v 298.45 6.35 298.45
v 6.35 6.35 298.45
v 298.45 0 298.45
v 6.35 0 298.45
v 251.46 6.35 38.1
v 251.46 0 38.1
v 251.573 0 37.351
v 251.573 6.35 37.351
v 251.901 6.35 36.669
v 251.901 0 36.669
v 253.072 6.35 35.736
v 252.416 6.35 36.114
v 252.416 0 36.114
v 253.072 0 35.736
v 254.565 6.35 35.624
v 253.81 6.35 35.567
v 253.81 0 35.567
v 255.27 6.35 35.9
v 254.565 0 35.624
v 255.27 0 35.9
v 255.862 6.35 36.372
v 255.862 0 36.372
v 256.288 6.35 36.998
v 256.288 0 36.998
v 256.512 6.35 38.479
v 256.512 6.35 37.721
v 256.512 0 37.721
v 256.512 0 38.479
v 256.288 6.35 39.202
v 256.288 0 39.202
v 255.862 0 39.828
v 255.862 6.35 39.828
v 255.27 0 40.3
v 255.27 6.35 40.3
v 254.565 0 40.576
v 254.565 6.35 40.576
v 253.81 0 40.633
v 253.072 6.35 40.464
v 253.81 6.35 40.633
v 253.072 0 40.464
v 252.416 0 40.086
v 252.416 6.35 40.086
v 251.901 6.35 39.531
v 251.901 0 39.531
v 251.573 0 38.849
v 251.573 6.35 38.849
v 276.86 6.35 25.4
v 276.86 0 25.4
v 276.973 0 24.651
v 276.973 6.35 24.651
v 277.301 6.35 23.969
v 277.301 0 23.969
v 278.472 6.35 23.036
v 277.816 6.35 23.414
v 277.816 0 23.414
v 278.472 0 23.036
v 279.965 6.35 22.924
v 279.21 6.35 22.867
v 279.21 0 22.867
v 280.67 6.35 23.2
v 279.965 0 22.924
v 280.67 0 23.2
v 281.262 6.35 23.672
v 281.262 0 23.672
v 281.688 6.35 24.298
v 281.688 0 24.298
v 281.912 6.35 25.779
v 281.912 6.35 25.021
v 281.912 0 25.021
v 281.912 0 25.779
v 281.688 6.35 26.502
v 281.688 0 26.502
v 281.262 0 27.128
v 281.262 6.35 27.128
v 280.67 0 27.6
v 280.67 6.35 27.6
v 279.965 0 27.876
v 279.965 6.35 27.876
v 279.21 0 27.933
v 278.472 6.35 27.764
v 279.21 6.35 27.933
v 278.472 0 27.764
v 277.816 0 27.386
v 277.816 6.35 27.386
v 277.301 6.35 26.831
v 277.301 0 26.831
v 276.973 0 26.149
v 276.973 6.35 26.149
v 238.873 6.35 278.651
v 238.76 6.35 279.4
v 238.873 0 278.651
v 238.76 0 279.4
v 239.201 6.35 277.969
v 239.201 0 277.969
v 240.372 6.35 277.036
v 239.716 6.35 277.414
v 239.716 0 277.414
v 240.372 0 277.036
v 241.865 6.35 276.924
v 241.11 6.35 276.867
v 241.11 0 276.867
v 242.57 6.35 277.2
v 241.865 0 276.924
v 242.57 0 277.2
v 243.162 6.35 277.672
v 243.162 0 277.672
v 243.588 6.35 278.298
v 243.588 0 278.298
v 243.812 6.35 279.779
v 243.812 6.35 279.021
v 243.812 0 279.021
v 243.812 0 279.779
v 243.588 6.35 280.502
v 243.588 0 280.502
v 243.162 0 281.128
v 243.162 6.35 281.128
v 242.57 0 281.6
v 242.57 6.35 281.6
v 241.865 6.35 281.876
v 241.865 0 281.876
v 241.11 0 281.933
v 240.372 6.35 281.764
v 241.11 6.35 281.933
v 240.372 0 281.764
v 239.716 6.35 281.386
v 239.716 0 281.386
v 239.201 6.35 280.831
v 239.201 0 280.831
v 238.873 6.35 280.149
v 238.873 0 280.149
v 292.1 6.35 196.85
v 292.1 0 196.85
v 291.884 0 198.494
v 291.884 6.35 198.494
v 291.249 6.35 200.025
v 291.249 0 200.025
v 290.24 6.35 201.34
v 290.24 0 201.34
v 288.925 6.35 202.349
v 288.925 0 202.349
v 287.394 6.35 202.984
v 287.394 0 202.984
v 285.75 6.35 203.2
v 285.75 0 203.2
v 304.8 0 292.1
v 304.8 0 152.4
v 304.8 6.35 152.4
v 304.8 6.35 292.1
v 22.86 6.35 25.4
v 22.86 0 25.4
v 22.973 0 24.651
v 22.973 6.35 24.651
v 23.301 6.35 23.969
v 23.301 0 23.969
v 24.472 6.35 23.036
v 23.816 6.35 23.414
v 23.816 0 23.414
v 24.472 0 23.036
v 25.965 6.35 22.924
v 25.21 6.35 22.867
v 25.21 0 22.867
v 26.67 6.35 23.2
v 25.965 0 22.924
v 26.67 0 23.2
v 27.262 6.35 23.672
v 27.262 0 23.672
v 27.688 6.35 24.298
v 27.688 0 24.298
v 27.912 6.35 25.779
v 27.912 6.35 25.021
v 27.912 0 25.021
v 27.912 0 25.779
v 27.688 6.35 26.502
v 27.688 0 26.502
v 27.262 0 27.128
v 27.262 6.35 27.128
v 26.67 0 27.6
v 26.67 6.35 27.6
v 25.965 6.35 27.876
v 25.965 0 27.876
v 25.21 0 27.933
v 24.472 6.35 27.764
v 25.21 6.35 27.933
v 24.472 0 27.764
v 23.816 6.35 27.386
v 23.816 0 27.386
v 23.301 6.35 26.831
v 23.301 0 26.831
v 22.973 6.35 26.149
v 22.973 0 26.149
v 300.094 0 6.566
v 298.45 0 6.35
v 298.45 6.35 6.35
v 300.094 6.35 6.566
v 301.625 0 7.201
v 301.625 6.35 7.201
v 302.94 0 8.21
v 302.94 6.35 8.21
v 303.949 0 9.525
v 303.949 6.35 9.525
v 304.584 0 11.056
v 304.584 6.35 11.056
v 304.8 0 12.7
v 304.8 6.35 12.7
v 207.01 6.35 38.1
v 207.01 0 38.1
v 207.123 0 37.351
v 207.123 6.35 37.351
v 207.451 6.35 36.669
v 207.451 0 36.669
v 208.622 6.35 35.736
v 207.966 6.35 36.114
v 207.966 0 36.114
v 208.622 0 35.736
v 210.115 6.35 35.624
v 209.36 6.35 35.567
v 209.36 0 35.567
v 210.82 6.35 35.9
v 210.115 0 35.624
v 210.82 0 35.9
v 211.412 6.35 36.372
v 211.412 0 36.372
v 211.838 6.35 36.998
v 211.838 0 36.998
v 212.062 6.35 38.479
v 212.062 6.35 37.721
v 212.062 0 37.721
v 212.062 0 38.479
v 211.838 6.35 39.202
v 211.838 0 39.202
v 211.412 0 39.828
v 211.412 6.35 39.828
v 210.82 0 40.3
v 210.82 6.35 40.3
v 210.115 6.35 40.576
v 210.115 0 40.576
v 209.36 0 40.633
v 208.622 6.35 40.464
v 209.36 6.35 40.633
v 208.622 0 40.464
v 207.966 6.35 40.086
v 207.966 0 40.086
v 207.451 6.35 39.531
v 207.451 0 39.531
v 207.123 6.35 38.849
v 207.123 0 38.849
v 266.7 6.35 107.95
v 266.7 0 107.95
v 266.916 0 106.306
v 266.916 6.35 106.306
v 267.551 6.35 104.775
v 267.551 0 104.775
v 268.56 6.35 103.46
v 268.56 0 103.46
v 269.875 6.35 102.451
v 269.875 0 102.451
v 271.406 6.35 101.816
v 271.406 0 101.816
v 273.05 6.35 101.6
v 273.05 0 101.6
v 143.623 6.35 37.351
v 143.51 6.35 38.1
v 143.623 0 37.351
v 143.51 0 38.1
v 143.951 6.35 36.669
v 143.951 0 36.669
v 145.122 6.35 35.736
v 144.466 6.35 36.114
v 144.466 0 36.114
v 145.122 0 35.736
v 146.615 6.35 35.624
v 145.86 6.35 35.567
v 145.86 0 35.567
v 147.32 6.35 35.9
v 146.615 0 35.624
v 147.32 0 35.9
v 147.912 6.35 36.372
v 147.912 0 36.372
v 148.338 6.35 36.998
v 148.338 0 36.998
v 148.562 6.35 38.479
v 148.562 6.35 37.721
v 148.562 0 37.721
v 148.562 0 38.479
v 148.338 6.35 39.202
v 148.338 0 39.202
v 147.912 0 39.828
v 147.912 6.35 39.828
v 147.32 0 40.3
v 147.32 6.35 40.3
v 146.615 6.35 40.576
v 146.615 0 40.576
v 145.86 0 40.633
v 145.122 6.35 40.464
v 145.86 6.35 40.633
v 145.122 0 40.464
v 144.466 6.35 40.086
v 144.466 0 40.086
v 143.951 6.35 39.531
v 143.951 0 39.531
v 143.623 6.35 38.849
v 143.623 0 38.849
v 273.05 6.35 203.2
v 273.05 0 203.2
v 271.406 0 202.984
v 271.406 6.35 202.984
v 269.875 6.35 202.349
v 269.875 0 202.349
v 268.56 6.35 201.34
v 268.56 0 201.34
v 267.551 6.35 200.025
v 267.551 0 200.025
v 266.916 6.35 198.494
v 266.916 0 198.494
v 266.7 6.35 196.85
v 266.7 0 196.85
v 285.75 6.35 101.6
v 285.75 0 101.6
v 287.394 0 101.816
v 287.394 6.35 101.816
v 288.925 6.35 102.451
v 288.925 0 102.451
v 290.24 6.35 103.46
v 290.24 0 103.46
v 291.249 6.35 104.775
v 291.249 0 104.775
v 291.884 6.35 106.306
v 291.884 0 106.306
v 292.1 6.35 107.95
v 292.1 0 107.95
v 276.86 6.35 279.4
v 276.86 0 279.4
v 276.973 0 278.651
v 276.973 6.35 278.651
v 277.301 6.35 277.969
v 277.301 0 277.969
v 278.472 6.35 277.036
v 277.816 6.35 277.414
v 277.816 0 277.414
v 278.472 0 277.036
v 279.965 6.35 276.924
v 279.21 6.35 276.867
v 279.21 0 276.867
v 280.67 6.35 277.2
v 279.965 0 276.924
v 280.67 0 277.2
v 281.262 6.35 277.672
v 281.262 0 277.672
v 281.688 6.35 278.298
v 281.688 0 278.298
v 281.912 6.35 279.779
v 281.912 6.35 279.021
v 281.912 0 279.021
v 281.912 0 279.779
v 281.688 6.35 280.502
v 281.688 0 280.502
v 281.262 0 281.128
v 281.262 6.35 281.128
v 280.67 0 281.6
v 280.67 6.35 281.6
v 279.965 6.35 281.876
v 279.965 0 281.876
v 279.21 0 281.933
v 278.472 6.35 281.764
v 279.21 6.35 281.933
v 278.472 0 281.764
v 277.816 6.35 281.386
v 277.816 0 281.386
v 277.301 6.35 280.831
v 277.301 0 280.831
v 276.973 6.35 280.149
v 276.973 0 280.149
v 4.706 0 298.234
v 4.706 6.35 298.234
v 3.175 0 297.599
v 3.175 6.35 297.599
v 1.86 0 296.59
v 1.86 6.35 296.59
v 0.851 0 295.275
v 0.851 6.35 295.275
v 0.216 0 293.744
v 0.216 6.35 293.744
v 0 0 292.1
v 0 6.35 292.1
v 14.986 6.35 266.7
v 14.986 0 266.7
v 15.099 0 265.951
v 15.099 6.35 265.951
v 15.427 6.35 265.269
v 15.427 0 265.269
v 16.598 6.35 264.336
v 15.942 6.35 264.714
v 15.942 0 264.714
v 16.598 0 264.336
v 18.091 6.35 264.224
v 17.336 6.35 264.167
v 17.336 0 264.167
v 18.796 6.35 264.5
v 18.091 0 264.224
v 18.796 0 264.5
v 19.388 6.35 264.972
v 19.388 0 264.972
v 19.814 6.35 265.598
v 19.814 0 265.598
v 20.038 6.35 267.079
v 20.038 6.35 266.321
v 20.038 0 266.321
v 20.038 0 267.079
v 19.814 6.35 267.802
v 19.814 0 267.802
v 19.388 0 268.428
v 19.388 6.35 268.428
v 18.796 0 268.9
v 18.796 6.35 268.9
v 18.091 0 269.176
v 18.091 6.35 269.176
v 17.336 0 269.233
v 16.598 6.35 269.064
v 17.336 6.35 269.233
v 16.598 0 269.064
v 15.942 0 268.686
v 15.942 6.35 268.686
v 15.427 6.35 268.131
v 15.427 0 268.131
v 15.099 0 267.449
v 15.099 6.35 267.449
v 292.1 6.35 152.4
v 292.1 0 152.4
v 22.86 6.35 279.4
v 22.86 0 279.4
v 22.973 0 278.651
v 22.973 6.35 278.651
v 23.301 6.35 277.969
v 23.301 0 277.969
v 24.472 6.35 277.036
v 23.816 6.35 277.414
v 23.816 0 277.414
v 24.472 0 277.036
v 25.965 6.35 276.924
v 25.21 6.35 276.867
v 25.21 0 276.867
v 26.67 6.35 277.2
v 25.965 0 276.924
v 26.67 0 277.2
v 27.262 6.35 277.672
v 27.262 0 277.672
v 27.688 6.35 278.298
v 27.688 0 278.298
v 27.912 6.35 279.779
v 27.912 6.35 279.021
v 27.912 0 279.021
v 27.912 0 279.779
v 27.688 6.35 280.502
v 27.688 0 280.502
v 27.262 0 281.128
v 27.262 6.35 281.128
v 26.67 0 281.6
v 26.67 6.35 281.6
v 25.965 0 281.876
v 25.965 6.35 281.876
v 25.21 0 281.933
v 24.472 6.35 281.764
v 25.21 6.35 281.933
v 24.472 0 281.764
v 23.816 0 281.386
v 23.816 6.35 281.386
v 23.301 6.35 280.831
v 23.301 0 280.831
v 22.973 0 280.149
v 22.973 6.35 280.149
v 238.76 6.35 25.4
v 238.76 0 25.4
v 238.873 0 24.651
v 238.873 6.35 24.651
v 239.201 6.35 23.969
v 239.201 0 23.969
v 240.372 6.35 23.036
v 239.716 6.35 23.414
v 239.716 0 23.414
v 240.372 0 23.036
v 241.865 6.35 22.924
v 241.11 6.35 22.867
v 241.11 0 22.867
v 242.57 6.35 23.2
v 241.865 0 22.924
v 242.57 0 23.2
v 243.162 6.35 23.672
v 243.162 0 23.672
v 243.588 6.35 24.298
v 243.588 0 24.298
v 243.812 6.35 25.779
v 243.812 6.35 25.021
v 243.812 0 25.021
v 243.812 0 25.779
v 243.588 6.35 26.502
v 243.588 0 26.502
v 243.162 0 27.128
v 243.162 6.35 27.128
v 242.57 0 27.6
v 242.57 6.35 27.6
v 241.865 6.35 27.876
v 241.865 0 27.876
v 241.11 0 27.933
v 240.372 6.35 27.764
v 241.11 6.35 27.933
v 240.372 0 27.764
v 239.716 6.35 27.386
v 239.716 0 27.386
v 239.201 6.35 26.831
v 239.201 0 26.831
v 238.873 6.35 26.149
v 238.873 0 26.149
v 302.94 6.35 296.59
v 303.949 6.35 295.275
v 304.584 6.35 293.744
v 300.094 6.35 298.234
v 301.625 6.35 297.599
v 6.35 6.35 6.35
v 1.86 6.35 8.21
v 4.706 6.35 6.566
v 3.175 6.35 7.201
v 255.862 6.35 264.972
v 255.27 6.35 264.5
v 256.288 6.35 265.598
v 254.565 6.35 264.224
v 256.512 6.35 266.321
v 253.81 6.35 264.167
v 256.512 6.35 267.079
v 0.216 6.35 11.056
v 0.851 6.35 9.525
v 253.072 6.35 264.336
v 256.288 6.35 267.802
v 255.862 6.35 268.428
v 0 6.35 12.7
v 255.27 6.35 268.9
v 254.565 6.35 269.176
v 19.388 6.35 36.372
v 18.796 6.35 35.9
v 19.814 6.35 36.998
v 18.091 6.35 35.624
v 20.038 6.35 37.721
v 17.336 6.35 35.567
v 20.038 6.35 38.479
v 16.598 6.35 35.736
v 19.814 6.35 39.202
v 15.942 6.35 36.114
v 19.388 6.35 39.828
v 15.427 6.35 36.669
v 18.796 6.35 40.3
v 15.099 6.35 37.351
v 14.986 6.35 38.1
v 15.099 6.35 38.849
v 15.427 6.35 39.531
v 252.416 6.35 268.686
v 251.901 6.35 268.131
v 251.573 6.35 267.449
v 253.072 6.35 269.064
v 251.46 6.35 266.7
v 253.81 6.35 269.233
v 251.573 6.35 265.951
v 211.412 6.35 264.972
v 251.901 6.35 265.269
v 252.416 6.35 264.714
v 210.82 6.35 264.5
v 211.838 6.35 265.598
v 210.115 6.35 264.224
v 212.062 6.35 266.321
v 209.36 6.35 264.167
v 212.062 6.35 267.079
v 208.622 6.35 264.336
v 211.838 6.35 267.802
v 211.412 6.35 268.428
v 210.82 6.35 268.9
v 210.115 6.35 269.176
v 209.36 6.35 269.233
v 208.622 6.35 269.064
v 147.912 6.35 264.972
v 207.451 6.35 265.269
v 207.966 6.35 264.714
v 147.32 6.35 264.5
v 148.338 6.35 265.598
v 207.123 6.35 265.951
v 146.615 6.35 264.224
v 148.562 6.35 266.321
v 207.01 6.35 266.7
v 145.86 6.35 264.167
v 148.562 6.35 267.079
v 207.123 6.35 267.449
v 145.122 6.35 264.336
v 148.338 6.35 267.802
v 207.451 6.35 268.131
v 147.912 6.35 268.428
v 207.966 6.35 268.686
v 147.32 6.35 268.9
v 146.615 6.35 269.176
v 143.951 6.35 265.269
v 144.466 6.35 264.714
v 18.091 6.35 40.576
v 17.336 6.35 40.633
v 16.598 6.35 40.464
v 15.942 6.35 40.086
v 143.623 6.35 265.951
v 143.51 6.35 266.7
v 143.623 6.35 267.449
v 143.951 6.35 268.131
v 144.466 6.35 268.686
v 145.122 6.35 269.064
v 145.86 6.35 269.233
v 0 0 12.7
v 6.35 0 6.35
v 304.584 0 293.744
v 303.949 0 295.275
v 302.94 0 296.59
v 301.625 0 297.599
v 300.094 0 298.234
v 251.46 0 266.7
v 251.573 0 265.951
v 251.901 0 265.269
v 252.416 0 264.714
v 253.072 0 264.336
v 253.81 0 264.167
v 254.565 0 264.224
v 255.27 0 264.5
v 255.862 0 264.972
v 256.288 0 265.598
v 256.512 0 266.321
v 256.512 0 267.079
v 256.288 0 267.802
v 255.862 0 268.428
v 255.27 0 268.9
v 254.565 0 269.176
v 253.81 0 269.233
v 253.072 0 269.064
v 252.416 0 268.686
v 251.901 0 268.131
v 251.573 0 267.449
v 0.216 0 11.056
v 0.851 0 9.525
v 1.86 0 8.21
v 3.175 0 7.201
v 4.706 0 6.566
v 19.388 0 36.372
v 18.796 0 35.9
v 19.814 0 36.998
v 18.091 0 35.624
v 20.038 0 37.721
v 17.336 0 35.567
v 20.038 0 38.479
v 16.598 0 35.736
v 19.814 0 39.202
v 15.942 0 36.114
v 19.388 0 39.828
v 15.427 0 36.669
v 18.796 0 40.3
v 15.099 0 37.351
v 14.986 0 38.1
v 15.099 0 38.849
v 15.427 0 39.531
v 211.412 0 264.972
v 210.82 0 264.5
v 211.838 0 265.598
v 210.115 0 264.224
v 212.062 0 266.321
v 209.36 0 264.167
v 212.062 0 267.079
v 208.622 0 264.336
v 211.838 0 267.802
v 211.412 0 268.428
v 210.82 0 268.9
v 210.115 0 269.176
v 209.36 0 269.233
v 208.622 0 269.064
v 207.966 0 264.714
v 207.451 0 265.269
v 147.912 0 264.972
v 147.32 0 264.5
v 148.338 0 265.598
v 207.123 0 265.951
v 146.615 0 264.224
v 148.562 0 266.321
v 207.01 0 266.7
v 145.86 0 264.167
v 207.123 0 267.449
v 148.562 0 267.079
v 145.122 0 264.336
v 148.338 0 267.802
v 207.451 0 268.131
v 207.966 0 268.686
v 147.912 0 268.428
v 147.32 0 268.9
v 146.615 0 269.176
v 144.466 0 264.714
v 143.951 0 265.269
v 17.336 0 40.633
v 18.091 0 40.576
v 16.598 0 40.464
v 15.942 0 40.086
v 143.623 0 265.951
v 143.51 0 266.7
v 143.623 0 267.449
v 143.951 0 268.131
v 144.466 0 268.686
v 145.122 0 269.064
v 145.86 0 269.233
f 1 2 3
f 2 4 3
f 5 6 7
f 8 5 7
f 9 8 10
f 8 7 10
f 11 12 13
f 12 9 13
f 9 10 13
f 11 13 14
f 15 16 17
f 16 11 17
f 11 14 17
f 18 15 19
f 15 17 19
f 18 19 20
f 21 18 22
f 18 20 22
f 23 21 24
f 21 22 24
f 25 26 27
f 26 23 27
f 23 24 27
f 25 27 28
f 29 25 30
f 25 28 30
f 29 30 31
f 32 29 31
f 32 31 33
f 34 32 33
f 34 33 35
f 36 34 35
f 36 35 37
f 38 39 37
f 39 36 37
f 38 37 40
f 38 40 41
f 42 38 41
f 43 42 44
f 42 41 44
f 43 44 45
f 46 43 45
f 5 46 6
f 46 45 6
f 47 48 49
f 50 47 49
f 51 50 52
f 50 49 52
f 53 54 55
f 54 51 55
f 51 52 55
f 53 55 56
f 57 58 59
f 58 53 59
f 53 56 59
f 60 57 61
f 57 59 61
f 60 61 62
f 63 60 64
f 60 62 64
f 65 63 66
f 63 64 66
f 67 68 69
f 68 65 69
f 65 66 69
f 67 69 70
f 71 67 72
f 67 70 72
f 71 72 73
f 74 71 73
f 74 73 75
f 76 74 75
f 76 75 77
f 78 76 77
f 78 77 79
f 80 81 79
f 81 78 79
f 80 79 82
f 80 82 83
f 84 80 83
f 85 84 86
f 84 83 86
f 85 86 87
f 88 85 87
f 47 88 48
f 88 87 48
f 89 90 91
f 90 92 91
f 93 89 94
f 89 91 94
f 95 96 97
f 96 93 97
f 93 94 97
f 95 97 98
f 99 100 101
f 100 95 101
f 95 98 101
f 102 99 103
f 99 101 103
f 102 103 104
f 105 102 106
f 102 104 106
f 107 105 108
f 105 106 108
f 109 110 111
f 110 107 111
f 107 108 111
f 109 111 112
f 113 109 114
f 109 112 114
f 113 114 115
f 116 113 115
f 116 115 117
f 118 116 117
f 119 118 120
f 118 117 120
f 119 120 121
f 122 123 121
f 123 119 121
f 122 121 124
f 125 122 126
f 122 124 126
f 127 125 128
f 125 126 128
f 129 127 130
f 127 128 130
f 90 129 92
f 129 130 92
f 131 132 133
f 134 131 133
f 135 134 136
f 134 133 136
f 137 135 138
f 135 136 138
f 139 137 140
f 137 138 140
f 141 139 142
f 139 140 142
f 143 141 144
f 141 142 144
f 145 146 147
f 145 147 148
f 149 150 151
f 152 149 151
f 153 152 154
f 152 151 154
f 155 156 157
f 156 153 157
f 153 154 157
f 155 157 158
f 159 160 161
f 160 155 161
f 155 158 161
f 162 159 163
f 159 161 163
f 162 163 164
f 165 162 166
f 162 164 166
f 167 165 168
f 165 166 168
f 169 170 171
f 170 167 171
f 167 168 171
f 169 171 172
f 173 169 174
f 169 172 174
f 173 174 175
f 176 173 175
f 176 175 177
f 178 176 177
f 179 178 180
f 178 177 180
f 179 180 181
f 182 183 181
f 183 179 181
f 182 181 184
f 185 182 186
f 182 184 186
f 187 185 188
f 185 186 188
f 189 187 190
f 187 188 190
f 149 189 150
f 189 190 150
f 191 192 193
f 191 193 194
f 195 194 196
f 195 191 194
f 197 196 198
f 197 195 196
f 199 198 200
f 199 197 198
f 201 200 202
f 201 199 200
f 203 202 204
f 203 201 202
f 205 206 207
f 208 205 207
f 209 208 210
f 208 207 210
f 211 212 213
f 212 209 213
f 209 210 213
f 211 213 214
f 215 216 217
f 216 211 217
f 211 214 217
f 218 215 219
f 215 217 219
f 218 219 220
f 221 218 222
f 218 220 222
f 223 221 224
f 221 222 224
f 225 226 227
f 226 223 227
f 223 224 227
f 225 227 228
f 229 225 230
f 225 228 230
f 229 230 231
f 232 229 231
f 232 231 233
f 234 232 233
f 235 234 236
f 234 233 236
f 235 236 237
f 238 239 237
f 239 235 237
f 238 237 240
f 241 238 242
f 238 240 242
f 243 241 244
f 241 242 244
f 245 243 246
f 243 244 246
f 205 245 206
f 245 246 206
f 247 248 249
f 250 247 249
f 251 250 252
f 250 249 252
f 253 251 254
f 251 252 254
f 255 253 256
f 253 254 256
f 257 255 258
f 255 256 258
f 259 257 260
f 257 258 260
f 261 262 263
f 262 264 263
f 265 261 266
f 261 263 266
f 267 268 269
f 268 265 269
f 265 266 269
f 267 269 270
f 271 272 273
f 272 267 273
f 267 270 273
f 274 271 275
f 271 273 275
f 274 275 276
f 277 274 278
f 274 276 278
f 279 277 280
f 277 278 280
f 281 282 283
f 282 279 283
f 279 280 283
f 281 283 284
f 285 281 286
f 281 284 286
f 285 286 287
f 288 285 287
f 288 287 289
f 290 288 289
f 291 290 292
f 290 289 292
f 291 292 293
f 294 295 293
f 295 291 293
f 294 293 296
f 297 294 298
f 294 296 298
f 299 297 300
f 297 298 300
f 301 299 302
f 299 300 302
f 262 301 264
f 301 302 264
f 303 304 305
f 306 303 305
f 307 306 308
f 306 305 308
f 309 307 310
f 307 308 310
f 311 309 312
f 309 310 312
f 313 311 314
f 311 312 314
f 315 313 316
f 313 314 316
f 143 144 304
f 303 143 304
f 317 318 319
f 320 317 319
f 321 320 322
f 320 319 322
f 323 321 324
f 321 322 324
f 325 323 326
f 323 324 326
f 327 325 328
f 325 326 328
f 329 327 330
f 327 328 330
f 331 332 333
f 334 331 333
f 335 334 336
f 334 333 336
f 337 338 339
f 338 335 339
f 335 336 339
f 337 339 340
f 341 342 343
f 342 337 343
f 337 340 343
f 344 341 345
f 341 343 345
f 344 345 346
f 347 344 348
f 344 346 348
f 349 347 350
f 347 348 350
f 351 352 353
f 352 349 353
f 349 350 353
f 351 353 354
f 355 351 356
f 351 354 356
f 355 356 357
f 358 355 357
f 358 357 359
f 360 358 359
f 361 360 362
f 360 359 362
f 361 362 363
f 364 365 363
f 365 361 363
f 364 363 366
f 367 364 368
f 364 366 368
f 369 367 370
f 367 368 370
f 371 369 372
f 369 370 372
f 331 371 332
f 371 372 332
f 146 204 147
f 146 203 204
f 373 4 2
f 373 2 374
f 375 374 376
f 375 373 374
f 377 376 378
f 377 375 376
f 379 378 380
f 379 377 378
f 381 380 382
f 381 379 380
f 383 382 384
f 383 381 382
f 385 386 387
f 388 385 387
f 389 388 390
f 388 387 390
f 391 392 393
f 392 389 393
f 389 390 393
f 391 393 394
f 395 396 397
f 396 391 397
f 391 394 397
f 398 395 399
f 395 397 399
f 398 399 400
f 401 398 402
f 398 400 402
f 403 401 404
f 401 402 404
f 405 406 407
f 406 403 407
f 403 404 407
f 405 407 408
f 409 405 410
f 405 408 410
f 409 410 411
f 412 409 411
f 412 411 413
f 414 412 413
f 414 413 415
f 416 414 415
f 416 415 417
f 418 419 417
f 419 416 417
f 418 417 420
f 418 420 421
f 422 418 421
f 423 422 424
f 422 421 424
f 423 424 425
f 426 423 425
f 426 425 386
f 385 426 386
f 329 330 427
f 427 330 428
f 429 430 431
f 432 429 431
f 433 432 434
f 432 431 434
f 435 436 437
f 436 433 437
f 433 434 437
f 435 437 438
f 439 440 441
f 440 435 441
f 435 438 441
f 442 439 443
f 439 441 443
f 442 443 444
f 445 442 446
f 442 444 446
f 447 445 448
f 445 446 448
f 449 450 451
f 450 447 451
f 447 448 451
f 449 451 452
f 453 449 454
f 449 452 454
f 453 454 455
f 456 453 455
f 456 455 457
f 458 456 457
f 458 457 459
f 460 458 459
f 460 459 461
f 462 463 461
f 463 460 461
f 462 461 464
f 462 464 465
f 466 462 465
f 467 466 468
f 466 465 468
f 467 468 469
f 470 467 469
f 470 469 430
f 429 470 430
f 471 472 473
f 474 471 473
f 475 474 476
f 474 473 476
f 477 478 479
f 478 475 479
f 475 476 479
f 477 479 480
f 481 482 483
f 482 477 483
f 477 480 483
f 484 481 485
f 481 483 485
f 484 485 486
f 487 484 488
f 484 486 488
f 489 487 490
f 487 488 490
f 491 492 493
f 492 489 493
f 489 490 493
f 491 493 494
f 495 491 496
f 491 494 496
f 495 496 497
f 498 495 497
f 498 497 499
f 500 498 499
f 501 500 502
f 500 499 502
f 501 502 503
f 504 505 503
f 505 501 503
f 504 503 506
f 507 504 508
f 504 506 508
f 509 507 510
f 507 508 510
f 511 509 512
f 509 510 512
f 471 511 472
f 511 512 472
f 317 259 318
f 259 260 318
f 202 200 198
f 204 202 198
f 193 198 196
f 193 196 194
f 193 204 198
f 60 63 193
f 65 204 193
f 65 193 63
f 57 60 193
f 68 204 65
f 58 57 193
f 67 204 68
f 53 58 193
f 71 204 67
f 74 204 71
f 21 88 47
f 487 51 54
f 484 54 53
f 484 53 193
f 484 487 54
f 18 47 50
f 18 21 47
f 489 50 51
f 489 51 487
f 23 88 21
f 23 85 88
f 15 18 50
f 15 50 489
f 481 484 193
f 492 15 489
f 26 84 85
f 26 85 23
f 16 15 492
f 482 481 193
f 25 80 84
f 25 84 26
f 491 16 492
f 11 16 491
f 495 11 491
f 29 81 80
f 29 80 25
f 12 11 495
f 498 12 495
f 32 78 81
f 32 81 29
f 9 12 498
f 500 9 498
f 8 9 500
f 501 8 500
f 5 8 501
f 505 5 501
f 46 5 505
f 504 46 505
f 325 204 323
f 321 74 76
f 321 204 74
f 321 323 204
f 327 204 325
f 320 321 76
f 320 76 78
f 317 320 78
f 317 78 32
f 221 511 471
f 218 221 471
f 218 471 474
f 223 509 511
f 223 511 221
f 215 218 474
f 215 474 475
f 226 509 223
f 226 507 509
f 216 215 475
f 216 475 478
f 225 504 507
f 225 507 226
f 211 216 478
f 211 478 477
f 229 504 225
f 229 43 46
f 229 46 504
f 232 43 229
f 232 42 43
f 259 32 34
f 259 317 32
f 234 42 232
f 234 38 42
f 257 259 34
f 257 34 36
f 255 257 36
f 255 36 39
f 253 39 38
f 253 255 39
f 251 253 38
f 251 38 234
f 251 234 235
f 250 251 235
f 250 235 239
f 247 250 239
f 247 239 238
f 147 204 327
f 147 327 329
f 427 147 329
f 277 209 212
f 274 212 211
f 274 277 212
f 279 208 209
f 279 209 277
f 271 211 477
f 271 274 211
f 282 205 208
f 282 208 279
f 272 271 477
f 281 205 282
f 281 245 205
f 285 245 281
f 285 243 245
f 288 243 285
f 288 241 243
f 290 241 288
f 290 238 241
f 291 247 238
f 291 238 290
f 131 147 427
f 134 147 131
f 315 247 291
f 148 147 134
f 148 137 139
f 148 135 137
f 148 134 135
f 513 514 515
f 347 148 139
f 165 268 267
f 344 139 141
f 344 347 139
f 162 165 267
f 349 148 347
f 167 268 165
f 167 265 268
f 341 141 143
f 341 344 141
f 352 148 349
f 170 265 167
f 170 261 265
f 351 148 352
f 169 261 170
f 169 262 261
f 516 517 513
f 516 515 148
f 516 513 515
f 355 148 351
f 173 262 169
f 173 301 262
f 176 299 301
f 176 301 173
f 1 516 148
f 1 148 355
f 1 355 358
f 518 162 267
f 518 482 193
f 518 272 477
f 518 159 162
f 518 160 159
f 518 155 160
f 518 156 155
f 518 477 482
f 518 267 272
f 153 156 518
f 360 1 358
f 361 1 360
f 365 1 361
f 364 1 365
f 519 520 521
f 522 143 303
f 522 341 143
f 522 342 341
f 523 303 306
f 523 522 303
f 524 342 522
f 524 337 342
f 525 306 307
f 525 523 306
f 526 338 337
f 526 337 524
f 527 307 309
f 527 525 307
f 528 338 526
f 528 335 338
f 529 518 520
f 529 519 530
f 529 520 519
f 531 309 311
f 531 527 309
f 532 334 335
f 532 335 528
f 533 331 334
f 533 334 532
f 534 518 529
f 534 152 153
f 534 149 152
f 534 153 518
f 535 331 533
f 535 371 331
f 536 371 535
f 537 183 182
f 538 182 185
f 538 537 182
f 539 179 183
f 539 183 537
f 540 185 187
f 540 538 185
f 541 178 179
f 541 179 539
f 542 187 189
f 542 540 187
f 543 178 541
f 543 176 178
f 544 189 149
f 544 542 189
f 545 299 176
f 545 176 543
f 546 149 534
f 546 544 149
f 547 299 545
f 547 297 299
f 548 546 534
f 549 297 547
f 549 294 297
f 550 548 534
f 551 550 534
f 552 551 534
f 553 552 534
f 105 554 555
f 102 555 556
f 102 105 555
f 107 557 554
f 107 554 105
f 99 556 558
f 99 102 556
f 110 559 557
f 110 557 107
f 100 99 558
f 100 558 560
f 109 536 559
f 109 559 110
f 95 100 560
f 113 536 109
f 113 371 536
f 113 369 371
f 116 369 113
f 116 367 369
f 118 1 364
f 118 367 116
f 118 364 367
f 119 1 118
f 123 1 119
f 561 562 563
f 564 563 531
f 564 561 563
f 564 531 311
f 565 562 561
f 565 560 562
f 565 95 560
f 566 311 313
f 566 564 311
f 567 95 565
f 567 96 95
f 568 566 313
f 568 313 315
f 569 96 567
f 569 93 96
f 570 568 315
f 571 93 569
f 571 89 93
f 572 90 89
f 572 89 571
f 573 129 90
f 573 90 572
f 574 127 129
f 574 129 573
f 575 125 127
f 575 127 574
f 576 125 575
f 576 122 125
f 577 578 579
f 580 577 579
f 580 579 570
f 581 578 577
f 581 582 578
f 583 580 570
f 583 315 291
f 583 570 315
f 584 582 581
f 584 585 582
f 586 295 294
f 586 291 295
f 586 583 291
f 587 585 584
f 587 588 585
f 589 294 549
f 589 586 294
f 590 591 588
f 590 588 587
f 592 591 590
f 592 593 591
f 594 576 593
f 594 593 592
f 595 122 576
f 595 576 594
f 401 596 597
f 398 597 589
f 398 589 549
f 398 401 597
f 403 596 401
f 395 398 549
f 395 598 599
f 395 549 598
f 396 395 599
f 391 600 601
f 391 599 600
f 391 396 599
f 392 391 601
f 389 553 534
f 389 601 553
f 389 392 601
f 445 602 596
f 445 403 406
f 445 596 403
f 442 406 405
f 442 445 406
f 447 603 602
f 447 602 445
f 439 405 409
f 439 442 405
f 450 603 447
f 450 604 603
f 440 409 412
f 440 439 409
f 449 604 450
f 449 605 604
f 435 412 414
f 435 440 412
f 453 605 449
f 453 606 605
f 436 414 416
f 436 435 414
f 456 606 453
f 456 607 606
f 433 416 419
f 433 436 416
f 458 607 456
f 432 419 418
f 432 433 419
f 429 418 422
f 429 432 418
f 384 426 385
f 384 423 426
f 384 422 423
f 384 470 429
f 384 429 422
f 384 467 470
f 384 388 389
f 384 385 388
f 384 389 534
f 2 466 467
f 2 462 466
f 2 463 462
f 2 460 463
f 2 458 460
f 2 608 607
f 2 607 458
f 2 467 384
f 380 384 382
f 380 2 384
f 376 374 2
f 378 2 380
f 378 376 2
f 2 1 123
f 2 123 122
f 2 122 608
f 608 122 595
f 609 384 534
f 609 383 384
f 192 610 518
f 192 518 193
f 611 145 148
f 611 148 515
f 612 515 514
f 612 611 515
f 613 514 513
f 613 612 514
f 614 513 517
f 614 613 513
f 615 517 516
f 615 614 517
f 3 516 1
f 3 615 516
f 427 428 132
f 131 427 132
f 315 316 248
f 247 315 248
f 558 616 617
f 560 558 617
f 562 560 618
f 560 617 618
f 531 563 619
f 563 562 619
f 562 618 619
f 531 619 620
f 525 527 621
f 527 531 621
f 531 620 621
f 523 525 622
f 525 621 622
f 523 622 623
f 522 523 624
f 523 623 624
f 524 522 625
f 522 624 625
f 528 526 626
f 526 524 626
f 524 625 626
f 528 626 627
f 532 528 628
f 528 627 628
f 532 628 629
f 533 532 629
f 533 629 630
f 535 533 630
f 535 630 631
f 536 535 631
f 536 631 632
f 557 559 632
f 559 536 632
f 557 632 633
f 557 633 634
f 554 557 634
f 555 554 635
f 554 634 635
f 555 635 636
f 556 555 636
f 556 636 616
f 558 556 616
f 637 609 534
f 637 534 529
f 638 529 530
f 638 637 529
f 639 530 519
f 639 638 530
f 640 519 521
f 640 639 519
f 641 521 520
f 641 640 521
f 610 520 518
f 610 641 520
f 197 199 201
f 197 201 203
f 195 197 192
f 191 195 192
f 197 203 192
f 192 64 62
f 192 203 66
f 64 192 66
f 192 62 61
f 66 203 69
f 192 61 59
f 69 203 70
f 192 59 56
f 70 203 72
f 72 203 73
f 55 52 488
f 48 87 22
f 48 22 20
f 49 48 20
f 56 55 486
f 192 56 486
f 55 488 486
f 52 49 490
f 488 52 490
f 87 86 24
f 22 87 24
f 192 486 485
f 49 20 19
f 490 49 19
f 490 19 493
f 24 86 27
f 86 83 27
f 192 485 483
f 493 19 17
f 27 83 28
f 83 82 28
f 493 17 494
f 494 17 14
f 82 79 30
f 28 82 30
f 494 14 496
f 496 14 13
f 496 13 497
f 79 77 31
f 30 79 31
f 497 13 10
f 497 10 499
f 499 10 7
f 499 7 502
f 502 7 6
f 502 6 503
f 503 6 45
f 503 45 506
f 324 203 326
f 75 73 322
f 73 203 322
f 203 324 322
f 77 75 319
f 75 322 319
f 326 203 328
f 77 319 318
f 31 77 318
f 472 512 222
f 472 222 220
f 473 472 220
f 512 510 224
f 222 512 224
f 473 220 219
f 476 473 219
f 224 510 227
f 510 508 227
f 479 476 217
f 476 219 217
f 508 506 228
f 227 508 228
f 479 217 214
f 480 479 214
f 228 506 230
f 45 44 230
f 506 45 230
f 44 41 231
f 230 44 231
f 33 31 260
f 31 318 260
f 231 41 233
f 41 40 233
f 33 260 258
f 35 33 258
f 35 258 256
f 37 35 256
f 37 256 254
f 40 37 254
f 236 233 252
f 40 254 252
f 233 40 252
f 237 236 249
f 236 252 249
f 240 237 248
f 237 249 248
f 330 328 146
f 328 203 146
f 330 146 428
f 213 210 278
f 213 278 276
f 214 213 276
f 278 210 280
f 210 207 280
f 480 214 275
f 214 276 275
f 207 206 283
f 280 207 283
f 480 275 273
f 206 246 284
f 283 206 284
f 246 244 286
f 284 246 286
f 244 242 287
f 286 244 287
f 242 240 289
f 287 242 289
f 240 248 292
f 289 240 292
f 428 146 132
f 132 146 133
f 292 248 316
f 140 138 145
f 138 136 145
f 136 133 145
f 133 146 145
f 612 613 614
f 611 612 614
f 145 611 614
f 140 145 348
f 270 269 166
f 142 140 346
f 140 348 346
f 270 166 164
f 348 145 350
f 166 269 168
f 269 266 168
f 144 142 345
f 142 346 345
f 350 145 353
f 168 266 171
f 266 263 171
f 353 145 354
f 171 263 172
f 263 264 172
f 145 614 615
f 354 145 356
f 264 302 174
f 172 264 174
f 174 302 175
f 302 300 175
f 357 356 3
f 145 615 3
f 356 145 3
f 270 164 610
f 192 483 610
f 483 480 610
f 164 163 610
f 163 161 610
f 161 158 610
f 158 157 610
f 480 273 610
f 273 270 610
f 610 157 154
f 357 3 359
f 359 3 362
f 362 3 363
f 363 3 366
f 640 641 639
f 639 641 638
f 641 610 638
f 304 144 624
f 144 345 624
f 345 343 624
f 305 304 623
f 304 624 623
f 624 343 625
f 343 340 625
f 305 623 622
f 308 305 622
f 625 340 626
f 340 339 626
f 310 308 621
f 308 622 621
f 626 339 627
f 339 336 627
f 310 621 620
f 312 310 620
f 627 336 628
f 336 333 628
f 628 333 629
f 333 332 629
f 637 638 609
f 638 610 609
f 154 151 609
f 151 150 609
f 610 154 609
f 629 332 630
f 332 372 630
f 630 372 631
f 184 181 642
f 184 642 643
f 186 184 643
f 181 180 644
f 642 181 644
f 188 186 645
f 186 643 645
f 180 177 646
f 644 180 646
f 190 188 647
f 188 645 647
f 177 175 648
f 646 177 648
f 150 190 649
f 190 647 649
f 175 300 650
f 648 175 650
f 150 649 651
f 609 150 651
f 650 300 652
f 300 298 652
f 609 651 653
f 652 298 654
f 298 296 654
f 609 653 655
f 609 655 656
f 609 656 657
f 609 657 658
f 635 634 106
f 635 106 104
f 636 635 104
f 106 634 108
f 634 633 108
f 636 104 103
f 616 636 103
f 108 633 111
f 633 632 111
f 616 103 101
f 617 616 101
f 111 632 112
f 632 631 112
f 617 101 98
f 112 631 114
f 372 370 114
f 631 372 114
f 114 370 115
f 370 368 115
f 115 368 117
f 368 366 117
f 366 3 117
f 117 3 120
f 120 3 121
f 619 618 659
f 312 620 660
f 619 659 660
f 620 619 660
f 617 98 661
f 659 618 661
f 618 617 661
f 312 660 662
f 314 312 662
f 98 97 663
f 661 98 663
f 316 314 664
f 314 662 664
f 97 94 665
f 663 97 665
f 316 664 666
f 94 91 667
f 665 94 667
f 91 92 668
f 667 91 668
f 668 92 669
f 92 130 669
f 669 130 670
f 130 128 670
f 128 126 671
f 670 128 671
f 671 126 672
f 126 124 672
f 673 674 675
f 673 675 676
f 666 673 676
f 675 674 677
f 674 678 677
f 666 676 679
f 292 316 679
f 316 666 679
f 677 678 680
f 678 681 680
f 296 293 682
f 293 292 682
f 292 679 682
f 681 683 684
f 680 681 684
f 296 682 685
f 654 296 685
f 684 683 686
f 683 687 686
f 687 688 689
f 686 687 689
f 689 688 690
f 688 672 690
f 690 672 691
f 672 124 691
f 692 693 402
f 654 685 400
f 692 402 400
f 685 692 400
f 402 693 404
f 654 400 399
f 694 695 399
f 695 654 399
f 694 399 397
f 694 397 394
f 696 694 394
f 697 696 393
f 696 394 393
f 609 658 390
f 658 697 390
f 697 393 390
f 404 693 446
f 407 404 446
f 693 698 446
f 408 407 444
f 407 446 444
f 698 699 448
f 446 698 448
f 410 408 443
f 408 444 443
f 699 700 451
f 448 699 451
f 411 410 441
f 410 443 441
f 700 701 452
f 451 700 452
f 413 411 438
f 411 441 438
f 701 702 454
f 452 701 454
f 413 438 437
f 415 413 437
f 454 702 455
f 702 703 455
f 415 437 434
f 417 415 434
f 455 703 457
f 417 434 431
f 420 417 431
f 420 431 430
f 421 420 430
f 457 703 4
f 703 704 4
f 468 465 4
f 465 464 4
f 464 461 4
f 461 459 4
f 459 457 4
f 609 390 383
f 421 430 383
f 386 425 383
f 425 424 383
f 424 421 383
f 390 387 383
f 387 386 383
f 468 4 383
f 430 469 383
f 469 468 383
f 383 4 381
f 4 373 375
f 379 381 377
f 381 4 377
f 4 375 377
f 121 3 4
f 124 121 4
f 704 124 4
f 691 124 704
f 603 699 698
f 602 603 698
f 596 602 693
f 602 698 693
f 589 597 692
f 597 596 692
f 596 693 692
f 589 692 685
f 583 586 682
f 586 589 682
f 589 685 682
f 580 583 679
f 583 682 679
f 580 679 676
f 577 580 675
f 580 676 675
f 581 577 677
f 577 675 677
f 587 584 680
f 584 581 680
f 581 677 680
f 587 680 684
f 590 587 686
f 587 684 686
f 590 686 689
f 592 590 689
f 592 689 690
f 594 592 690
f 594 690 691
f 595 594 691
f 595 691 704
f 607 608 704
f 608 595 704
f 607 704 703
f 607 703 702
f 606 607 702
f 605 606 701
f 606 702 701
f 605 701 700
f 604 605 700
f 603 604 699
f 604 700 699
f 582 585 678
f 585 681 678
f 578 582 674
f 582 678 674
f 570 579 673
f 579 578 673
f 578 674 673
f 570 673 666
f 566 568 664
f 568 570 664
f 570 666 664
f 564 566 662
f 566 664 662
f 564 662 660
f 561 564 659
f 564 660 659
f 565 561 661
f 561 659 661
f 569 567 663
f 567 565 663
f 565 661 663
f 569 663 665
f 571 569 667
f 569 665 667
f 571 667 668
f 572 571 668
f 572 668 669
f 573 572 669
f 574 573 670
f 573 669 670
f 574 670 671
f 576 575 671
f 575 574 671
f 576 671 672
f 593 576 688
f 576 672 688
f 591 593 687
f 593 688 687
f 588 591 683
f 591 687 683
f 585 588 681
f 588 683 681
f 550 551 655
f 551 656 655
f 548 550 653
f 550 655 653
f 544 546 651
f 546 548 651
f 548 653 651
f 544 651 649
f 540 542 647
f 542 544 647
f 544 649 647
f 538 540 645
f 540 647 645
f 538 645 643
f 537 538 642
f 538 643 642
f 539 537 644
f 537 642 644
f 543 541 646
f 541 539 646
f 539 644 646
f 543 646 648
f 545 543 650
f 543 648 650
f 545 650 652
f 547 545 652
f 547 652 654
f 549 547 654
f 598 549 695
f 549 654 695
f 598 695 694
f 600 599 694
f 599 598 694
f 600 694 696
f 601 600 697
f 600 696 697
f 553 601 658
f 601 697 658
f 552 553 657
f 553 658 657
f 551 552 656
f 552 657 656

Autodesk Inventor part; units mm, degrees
ref_plane "YZ Plane" through (0, 0, 0) normal (1, 0, 0) x (0, 1, 0)
ref_plane "XZ Plane" through (0, 0, 0) normal (0, 1, 0) x (-1, 0, 0)
ref_plane "XY Plane" through (0, 0, 0) normal (0, 0, 1) x (1, 0, 0)
sketch "Sketch1" plane through (0, 0, 0) normal (0, 1, 0) x (-1, 0, 0)
  line L0 (-304.8, 25.4) -> (-279.4, 25.4) construction
  line L1 (0, 25.4) -> (-25.4, 25.4) construction
  line L2 (0, 279.4) -> (-25.4, 279.4) construction
  line L3 (-304.8, 279.4) -> (-279.4, 279.4) construction
  circle A0 centre (-25.4, 279.4) radius 2.54
  circle A1 centre (-279.4, 279.4) radius 2.54
  circle A2 centre (-25.4, 25.4) radius 2.54
  circle A3 centre (-279.4, 25.4) radius 2.54
  line L4 (-304.8, 38.1) -> (-254, 38.1) construction
  circle A4 centre (-254, 38.1) radius 2.54
  line L5 (-304.8, 152.4) -> (-230.2081, 152.4) construction
  line L6 (-254, 38.1) -> (-209.55, 38.1) construction
  line L7 (-209.55, 38.1) -> (-146.05, 38.1) construction
  line L8 (-146.05, 38.1) -> (-17.526, 38.1) construction
  circle A5 centre (-209.55, 38.1) radius 2.54
  circle A6 centre (-146.05, 38.1) radius 2.54
  circle A7 centre (-17.526, 38.1) radius 2.54
  circle A8 centre (-254, 266.7) radius 2.54
  circle A9 centre (-209.55, 266.7) radius 2.54
  circle A10 centre (-146.05, 266.7) radius 2.54
  circle A11 centre (-17.526, 266.7) radius 2.54
  line L9 (-6.35, 298.45) -> (-298.45, 298.45)
  line L10 (-6.35, 6.35) -> (-298.45, 6.35)
  line L11 (0, 292.1) -> (0, 12.7)
  line L12 (-304.8, 12.7) -> (-304.8, 292.1)
  line L13 (-304.8, 152.4) -> (-292.1, 152.4)
  line L14 (-292.1, 152.4) -> (-292.1, 196.85)
  line L15 (-285.75, 203.2) -> (-273.05, 203.2)
  line L16 (-266.7, 196.85) -> (-266.7, 107.95)
  line L17 (-273.05, 101.6) -> (-285.75, 101.6)
  line L18 (-292.1, 107.95) -> (-292.1, 152.4)
  arc A12 (-285.75, 203.2) -> (-292.1, 196.85) centre (-285.75, 196.85) ccw
  arc A13 (-292.1, 107.95) -> (-285.75, 101.6) centre (-285.75, 107.95) ccw
  arc A14 (-273.05, 101.6) -> (-266.7, 107.95) centre (-273.05, 107.95) ccw
  arc A15 (-266.7, 196.85) -> (-273.05, 203.2) centre (-273.05, 196.85) ccw
  arc A16 (-304.8, 12.7) -> (-298.45, 6.35) centre (-298.45, 12.7) ccw
  arc A17 (-298.45, 298.45) -> (-304.8, 292.1) centre (-298.45, 292.1) ccw
  arc A18 (0, 292.1) -> (-6.35, 298.45) centre (-6.35, 292.1) ccw
  arc A19 (-6.35, 6.35) -> (0, 12.7) centre (-6.35, 12.7) ccw
  line L19 (-279.4, 25.4) -> (-241.3, 25.4) construction
  circle A20 centre (-241.3, 25.4) radius 2.54
  circle A21 centre (-241.3, 279.4) radius 2.54
  point P0 (0, 0)
  point P1 (-292.1, 203.2)
  point P2 (-266.7, 203.2)
  point P3 (-266.7, 101.6)
  point P4 (-292.1, 101.6)
  dimension "d3" = 25.4
  dimension "d5" = 25.4
  dimension "d7" = 25.4
  dimension "d9" = 25.4
  dimension "d10" = 5.08
  dimension "d11" = 5.08
  dimension "d12" = 5.08
  dimension "d13" = 5.08
  dimension "d15" = 50.8
  dimension "d16" = 5.08
  dimension "d18" = 44.45
  dimension "d19" = 63.5
  dimension "d20" = 128.524
  dimension "d21" = 5.08
  dimension "d22" = 5.08
  dimension "d23" = 5.08
  dimension "d27" = 50.8
  dimension "d28" = 25.4
  dimension "d29" = 101.6
  dimension "d31" = 6.35
  dimension "d32" = 6.35
  dimension "d33" = 6.35
  dimension "d34" = 6.35
  dimension "d35" = 6.35
  dimension "d38" = 38.1
  dimension "d39" = 5.08
extrude "Extrusion2" add sketch "Sketch1" along normal blind 6.35
properties part number "vrRig_v08_breadboardToSlideMount"
